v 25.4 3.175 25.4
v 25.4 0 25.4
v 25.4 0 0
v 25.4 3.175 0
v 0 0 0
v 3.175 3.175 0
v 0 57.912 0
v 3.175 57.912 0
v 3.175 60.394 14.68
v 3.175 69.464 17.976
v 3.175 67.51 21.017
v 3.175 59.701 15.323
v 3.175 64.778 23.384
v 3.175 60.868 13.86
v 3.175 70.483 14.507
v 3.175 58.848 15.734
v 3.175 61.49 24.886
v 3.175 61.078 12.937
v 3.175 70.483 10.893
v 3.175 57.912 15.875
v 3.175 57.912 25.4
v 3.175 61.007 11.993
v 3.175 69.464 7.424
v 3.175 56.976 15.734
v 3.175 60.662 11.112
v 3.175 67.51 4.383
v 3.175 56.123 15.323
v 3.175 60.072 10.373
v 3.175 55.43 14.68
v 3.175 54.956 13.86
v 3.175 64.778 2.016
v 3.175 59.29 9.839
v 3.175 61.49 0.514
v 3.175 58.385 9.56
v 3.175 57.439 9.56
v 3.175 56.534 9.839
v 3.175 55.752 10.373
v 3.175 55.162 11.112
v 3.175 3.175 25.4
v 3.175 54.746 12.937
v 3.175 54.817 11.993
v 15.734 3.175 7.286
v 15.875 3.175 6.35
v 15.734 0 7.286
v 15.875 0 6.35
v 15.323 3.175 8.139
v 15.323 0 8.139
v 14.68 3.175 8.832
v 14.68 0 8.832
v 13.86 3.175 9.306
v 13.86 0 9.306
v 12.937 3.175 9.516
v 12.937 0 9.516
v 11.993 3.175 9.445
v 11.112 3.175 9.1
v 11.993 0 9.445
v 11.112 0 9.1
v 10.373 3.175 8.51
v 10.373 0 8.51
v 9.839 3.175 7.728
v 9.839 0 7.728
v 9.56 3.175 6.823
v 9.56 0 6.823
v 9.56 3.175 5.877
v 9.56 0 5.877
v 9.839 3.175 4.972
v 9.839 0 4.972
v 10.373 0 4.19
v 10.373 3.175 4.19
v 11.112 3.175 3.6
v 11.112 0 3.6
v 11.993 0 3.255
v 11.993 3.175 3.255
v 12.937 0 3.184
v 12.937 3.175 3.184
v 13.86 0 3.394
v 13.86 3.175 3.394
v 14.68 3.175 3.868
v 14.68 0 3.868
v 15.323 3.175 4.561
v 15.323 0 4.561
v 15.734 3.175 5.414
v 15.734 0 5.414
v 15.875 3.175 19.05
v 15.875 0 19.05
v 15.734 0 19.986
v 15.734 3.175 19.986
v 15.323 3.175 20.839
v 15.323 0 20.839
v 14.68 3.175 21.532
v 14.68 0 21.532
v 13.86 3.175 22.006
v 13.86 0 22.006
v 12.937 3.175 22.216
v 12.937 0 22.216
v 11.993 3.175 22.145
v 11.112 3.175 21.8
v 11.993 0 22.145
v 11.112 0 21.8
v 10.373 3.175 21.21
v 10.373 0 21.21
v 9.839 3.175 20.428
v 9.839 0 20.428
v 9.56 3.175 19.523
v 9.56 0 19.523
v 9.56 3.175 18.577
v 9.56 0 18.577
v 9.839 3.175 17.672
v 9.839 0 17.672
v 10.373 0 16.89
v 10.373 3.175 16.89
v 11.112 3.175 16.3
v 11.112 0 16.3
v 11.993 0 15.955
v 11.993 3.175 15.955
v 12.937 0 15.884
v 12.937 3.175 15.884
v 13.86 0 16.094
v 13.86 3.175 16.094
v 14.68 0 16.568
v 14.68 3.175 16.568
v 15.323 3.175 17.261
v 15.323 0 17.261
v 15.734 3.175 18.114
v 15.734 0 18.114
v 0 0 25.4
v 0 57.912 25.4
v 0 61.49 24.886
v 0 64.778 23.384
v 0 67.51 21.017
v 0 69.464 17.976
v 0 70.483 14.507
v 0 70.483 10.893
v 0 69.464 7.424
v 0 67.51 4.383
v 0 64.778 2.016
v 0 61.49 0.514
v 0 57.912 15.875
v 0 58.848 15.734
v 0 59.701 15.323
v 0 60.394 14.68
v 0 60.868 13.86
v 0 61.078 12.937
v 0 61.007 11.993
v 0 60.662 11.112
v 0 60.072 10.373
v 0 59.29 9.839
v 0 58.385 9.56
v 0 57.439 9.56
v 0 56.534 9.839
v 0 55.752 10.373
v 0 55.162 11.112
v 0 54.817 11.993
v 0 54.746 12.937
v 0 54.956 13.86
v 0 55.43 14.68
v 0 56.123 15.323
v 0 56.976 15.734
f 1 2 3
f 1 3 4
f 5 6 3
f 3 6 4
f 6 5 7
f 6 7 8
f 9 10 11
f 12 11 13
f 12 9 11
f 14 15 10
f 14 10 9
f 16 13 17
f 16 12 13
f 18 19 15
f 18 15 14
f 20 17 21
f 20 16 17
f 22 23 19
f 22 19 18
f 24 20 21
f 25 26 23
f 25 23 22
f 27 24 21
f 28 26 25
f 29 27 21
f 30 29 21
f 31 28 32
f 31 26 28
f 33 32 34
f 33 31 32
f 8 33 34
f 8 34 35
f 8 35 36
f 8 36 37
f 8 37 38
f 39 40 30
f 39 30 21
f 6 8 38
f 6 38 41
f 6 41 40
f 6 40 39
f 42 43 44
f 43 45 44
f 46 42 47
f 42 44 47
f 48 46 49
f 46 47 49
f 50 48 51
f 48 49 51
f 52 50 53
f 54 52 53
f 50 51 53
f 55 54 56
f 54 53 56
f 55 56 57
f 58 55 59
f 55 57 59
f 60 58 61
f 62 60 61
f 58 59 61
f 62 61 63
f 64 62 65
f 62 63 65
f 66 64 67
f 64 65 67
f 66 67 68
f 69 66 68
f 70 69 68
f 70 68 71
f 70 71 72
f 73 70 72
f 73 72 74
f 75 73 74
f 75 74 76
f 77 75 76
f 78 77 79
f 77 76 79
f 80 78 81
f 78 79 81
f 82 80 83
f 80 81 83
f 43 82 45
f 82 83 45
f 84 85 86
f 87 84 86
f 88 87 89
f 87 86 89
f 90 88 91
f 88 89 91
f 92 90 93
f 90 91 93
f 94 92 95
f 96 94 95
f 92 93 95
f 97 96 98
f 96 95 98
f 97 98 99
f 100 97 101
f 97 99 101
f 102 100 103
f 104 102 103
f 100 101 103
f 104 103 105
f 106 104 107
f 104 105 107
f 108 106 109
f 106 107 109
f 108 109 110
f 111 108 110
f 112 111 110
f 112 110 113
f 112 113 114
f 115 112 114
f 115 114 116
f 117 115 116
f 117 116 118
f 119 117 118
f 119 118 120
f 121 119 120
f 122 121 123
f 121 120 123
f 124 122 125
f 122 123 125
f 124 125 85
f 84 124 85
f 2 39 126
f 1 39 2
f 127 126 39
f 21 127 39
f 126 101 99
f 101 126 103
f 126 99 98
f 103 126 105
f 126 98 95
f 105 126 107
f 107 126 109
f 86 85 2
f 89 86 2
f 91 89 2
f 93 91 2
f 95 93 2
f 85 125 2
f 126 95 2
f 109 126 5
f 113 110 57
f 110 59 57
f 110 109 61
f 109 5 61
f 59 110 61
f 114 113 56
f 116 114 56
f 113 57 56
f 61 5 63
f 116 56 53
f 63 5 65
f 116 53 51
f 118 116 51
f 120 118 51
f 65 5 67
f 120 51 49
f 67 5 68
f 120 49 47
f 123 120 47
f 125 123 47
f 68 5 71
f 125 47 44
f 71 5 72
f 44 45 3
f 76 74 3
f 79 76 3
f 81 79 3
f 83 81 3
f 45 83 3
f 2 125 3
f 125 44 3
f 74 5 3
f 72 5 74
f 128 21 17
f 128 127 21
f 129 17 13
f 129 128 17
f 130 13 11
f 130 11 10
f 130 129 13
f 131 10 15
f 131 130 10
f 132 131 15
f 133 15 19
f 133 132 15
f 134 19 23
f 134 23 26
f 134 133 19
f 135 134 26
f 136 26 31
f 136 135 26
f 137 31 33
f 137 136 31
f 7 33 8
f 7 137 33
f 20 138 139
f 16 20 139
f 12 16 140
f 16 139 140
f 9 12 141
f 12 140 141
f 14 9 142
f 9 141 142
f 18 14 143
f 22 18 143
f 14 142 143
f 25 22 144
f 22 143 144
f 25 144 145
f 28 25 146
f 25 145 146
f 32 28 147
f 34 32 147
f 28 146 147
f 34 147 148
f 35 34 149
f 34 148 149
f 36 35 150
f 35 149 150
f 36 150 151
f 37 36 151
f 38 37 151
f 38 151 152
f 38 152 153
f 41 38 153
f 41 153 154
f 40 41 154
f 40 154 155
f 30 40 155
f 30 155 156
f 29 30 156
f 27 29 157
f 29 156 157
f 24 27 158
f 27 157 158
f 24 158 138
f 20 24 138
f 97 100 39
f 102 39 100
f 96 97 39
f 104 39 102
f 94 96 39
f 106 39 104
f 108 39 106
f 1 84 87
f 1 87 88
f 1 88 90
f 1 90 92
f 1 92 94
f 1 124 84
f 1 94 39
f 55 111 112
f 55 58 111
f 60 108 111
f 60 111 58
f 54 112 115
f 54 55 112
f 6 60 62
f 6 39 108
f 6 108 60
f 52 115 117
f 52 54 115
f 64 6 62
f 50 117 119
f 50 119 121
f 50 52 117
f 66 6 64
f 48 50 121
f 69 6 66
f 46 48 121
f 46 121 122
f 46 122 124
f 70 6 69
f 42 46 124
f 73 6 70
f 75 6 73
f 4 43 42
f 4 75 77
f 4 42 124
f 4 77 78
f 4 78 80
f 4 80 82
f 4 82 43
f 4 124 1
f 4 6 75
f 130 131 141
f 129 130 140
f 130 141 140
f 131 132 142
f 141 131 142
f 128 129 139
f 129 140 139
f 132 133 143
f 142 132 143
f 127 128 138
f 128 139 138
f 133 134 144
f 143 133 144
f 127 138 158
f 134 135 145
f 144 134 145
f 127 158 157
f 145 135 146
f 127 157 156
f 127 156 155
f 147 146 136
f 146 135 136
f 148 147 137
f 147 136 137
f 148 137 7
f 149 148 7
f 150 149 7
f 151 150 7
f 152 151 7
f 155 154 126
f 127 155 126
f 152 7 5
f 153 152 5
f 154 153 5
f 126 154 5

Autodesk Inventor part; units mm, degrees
ref_plane "YZ Plane" through (0, 0, 0) normal (1, 0, 0) x (0, 1, 0)
ref_plane "XZ Plane" through (0, 0, 0) normal (0, 1, 0) x (-1, 0, 0)
ref_plane "XY Plane" through (0, 0, 0) normal (0, 0, 1) x (1, 0, 0)
sketch "Sketch1" plane through (0, 0, 0) normal (0, 0, 1) x (1, 0, 0)
  line L0 (0, 0) -> (25.4, 0)
  line L1 (25.4, 0) -> (25.4, 3.175)
  line L2 (3.175, 76.2) -> (0, 76.2)
  line L3 (0, 76.2) -> (0, 0)
  line L4 (3.175, 76.2) -> (3.175, 3.175)
  line L5 (3.175, 3.175) -> (25.4, 3.175)
  dimension "d0" = 3.175
  dimension "d1" = 3.175
  dimension "d2" = 76.2
  dimension "d3" = 25.4
extrude "Extrusion1" add sketch "Sketch1" along normal blind 25.4
sketch "Sketch2" plane through (0, 0, 0) normal (0, -1, 0) x (1, 0, 0)
  line L0 (25.4, 25.4) -> (0, 25.4) projected
  line L1 (0, 0) -> (25.4, 0) projected
  line L2 (25.4, 0) -> (25.4, 25.4) projected
  circle A0 centre (12.7, 19.05) radius 3.175
  circle A1 centre (12.7, 6.35) radius 3.175
  dimension "d6" = 12.7
  dimension "d7" = 6.35
  dimension "d8" = 6.35
  dimension "d9" = 6.35
  dimension "d10" = 6.35
  dimension "d11" = 12.7
extrude "Extrusion2" cut sketch "Sketch2" against normal blind 25.4
sketch "Sketch3" plane through (0, 0, 0) normal (-1, 0, 0) x (0, 0, 1)
  line L0 (25.4, 0) -> (25.4, 76.2) projected
  line L1 (0, 0) -> (25.4, 0) projected
  circle A0 centre (12.7, 57.912) radius 3.175
  line L2 (0, 76.2) -> (0, 0) projected
  arc A1 (25.4, 57.912) -> (0, 57.912) centre (12.7, 57.912) ccw
  line L3 (0, 76.2) -> (25.4, 76.2) projected
  line L4 (0, 57.912) -> (0, 76.2)
  line L5 (25.4, 76.2) -> (25.4, 57.912)
  line L6 (25.4, 76.2) -> (0, 76.2)
  dimension "d14" = 6.35
  dimension "d15" = 57.912
  dimension "d16" = 12.7
extrude "Extrusion3" cut sketch "Sketch3" against normal blind 25.4 contours A1 L2 L3 L0 | A0
equation "\"d1\" = d0"
equation "\"d10\" = d8"
equation "\"d11\" = d6"
properties part number "uptake support bracket"
